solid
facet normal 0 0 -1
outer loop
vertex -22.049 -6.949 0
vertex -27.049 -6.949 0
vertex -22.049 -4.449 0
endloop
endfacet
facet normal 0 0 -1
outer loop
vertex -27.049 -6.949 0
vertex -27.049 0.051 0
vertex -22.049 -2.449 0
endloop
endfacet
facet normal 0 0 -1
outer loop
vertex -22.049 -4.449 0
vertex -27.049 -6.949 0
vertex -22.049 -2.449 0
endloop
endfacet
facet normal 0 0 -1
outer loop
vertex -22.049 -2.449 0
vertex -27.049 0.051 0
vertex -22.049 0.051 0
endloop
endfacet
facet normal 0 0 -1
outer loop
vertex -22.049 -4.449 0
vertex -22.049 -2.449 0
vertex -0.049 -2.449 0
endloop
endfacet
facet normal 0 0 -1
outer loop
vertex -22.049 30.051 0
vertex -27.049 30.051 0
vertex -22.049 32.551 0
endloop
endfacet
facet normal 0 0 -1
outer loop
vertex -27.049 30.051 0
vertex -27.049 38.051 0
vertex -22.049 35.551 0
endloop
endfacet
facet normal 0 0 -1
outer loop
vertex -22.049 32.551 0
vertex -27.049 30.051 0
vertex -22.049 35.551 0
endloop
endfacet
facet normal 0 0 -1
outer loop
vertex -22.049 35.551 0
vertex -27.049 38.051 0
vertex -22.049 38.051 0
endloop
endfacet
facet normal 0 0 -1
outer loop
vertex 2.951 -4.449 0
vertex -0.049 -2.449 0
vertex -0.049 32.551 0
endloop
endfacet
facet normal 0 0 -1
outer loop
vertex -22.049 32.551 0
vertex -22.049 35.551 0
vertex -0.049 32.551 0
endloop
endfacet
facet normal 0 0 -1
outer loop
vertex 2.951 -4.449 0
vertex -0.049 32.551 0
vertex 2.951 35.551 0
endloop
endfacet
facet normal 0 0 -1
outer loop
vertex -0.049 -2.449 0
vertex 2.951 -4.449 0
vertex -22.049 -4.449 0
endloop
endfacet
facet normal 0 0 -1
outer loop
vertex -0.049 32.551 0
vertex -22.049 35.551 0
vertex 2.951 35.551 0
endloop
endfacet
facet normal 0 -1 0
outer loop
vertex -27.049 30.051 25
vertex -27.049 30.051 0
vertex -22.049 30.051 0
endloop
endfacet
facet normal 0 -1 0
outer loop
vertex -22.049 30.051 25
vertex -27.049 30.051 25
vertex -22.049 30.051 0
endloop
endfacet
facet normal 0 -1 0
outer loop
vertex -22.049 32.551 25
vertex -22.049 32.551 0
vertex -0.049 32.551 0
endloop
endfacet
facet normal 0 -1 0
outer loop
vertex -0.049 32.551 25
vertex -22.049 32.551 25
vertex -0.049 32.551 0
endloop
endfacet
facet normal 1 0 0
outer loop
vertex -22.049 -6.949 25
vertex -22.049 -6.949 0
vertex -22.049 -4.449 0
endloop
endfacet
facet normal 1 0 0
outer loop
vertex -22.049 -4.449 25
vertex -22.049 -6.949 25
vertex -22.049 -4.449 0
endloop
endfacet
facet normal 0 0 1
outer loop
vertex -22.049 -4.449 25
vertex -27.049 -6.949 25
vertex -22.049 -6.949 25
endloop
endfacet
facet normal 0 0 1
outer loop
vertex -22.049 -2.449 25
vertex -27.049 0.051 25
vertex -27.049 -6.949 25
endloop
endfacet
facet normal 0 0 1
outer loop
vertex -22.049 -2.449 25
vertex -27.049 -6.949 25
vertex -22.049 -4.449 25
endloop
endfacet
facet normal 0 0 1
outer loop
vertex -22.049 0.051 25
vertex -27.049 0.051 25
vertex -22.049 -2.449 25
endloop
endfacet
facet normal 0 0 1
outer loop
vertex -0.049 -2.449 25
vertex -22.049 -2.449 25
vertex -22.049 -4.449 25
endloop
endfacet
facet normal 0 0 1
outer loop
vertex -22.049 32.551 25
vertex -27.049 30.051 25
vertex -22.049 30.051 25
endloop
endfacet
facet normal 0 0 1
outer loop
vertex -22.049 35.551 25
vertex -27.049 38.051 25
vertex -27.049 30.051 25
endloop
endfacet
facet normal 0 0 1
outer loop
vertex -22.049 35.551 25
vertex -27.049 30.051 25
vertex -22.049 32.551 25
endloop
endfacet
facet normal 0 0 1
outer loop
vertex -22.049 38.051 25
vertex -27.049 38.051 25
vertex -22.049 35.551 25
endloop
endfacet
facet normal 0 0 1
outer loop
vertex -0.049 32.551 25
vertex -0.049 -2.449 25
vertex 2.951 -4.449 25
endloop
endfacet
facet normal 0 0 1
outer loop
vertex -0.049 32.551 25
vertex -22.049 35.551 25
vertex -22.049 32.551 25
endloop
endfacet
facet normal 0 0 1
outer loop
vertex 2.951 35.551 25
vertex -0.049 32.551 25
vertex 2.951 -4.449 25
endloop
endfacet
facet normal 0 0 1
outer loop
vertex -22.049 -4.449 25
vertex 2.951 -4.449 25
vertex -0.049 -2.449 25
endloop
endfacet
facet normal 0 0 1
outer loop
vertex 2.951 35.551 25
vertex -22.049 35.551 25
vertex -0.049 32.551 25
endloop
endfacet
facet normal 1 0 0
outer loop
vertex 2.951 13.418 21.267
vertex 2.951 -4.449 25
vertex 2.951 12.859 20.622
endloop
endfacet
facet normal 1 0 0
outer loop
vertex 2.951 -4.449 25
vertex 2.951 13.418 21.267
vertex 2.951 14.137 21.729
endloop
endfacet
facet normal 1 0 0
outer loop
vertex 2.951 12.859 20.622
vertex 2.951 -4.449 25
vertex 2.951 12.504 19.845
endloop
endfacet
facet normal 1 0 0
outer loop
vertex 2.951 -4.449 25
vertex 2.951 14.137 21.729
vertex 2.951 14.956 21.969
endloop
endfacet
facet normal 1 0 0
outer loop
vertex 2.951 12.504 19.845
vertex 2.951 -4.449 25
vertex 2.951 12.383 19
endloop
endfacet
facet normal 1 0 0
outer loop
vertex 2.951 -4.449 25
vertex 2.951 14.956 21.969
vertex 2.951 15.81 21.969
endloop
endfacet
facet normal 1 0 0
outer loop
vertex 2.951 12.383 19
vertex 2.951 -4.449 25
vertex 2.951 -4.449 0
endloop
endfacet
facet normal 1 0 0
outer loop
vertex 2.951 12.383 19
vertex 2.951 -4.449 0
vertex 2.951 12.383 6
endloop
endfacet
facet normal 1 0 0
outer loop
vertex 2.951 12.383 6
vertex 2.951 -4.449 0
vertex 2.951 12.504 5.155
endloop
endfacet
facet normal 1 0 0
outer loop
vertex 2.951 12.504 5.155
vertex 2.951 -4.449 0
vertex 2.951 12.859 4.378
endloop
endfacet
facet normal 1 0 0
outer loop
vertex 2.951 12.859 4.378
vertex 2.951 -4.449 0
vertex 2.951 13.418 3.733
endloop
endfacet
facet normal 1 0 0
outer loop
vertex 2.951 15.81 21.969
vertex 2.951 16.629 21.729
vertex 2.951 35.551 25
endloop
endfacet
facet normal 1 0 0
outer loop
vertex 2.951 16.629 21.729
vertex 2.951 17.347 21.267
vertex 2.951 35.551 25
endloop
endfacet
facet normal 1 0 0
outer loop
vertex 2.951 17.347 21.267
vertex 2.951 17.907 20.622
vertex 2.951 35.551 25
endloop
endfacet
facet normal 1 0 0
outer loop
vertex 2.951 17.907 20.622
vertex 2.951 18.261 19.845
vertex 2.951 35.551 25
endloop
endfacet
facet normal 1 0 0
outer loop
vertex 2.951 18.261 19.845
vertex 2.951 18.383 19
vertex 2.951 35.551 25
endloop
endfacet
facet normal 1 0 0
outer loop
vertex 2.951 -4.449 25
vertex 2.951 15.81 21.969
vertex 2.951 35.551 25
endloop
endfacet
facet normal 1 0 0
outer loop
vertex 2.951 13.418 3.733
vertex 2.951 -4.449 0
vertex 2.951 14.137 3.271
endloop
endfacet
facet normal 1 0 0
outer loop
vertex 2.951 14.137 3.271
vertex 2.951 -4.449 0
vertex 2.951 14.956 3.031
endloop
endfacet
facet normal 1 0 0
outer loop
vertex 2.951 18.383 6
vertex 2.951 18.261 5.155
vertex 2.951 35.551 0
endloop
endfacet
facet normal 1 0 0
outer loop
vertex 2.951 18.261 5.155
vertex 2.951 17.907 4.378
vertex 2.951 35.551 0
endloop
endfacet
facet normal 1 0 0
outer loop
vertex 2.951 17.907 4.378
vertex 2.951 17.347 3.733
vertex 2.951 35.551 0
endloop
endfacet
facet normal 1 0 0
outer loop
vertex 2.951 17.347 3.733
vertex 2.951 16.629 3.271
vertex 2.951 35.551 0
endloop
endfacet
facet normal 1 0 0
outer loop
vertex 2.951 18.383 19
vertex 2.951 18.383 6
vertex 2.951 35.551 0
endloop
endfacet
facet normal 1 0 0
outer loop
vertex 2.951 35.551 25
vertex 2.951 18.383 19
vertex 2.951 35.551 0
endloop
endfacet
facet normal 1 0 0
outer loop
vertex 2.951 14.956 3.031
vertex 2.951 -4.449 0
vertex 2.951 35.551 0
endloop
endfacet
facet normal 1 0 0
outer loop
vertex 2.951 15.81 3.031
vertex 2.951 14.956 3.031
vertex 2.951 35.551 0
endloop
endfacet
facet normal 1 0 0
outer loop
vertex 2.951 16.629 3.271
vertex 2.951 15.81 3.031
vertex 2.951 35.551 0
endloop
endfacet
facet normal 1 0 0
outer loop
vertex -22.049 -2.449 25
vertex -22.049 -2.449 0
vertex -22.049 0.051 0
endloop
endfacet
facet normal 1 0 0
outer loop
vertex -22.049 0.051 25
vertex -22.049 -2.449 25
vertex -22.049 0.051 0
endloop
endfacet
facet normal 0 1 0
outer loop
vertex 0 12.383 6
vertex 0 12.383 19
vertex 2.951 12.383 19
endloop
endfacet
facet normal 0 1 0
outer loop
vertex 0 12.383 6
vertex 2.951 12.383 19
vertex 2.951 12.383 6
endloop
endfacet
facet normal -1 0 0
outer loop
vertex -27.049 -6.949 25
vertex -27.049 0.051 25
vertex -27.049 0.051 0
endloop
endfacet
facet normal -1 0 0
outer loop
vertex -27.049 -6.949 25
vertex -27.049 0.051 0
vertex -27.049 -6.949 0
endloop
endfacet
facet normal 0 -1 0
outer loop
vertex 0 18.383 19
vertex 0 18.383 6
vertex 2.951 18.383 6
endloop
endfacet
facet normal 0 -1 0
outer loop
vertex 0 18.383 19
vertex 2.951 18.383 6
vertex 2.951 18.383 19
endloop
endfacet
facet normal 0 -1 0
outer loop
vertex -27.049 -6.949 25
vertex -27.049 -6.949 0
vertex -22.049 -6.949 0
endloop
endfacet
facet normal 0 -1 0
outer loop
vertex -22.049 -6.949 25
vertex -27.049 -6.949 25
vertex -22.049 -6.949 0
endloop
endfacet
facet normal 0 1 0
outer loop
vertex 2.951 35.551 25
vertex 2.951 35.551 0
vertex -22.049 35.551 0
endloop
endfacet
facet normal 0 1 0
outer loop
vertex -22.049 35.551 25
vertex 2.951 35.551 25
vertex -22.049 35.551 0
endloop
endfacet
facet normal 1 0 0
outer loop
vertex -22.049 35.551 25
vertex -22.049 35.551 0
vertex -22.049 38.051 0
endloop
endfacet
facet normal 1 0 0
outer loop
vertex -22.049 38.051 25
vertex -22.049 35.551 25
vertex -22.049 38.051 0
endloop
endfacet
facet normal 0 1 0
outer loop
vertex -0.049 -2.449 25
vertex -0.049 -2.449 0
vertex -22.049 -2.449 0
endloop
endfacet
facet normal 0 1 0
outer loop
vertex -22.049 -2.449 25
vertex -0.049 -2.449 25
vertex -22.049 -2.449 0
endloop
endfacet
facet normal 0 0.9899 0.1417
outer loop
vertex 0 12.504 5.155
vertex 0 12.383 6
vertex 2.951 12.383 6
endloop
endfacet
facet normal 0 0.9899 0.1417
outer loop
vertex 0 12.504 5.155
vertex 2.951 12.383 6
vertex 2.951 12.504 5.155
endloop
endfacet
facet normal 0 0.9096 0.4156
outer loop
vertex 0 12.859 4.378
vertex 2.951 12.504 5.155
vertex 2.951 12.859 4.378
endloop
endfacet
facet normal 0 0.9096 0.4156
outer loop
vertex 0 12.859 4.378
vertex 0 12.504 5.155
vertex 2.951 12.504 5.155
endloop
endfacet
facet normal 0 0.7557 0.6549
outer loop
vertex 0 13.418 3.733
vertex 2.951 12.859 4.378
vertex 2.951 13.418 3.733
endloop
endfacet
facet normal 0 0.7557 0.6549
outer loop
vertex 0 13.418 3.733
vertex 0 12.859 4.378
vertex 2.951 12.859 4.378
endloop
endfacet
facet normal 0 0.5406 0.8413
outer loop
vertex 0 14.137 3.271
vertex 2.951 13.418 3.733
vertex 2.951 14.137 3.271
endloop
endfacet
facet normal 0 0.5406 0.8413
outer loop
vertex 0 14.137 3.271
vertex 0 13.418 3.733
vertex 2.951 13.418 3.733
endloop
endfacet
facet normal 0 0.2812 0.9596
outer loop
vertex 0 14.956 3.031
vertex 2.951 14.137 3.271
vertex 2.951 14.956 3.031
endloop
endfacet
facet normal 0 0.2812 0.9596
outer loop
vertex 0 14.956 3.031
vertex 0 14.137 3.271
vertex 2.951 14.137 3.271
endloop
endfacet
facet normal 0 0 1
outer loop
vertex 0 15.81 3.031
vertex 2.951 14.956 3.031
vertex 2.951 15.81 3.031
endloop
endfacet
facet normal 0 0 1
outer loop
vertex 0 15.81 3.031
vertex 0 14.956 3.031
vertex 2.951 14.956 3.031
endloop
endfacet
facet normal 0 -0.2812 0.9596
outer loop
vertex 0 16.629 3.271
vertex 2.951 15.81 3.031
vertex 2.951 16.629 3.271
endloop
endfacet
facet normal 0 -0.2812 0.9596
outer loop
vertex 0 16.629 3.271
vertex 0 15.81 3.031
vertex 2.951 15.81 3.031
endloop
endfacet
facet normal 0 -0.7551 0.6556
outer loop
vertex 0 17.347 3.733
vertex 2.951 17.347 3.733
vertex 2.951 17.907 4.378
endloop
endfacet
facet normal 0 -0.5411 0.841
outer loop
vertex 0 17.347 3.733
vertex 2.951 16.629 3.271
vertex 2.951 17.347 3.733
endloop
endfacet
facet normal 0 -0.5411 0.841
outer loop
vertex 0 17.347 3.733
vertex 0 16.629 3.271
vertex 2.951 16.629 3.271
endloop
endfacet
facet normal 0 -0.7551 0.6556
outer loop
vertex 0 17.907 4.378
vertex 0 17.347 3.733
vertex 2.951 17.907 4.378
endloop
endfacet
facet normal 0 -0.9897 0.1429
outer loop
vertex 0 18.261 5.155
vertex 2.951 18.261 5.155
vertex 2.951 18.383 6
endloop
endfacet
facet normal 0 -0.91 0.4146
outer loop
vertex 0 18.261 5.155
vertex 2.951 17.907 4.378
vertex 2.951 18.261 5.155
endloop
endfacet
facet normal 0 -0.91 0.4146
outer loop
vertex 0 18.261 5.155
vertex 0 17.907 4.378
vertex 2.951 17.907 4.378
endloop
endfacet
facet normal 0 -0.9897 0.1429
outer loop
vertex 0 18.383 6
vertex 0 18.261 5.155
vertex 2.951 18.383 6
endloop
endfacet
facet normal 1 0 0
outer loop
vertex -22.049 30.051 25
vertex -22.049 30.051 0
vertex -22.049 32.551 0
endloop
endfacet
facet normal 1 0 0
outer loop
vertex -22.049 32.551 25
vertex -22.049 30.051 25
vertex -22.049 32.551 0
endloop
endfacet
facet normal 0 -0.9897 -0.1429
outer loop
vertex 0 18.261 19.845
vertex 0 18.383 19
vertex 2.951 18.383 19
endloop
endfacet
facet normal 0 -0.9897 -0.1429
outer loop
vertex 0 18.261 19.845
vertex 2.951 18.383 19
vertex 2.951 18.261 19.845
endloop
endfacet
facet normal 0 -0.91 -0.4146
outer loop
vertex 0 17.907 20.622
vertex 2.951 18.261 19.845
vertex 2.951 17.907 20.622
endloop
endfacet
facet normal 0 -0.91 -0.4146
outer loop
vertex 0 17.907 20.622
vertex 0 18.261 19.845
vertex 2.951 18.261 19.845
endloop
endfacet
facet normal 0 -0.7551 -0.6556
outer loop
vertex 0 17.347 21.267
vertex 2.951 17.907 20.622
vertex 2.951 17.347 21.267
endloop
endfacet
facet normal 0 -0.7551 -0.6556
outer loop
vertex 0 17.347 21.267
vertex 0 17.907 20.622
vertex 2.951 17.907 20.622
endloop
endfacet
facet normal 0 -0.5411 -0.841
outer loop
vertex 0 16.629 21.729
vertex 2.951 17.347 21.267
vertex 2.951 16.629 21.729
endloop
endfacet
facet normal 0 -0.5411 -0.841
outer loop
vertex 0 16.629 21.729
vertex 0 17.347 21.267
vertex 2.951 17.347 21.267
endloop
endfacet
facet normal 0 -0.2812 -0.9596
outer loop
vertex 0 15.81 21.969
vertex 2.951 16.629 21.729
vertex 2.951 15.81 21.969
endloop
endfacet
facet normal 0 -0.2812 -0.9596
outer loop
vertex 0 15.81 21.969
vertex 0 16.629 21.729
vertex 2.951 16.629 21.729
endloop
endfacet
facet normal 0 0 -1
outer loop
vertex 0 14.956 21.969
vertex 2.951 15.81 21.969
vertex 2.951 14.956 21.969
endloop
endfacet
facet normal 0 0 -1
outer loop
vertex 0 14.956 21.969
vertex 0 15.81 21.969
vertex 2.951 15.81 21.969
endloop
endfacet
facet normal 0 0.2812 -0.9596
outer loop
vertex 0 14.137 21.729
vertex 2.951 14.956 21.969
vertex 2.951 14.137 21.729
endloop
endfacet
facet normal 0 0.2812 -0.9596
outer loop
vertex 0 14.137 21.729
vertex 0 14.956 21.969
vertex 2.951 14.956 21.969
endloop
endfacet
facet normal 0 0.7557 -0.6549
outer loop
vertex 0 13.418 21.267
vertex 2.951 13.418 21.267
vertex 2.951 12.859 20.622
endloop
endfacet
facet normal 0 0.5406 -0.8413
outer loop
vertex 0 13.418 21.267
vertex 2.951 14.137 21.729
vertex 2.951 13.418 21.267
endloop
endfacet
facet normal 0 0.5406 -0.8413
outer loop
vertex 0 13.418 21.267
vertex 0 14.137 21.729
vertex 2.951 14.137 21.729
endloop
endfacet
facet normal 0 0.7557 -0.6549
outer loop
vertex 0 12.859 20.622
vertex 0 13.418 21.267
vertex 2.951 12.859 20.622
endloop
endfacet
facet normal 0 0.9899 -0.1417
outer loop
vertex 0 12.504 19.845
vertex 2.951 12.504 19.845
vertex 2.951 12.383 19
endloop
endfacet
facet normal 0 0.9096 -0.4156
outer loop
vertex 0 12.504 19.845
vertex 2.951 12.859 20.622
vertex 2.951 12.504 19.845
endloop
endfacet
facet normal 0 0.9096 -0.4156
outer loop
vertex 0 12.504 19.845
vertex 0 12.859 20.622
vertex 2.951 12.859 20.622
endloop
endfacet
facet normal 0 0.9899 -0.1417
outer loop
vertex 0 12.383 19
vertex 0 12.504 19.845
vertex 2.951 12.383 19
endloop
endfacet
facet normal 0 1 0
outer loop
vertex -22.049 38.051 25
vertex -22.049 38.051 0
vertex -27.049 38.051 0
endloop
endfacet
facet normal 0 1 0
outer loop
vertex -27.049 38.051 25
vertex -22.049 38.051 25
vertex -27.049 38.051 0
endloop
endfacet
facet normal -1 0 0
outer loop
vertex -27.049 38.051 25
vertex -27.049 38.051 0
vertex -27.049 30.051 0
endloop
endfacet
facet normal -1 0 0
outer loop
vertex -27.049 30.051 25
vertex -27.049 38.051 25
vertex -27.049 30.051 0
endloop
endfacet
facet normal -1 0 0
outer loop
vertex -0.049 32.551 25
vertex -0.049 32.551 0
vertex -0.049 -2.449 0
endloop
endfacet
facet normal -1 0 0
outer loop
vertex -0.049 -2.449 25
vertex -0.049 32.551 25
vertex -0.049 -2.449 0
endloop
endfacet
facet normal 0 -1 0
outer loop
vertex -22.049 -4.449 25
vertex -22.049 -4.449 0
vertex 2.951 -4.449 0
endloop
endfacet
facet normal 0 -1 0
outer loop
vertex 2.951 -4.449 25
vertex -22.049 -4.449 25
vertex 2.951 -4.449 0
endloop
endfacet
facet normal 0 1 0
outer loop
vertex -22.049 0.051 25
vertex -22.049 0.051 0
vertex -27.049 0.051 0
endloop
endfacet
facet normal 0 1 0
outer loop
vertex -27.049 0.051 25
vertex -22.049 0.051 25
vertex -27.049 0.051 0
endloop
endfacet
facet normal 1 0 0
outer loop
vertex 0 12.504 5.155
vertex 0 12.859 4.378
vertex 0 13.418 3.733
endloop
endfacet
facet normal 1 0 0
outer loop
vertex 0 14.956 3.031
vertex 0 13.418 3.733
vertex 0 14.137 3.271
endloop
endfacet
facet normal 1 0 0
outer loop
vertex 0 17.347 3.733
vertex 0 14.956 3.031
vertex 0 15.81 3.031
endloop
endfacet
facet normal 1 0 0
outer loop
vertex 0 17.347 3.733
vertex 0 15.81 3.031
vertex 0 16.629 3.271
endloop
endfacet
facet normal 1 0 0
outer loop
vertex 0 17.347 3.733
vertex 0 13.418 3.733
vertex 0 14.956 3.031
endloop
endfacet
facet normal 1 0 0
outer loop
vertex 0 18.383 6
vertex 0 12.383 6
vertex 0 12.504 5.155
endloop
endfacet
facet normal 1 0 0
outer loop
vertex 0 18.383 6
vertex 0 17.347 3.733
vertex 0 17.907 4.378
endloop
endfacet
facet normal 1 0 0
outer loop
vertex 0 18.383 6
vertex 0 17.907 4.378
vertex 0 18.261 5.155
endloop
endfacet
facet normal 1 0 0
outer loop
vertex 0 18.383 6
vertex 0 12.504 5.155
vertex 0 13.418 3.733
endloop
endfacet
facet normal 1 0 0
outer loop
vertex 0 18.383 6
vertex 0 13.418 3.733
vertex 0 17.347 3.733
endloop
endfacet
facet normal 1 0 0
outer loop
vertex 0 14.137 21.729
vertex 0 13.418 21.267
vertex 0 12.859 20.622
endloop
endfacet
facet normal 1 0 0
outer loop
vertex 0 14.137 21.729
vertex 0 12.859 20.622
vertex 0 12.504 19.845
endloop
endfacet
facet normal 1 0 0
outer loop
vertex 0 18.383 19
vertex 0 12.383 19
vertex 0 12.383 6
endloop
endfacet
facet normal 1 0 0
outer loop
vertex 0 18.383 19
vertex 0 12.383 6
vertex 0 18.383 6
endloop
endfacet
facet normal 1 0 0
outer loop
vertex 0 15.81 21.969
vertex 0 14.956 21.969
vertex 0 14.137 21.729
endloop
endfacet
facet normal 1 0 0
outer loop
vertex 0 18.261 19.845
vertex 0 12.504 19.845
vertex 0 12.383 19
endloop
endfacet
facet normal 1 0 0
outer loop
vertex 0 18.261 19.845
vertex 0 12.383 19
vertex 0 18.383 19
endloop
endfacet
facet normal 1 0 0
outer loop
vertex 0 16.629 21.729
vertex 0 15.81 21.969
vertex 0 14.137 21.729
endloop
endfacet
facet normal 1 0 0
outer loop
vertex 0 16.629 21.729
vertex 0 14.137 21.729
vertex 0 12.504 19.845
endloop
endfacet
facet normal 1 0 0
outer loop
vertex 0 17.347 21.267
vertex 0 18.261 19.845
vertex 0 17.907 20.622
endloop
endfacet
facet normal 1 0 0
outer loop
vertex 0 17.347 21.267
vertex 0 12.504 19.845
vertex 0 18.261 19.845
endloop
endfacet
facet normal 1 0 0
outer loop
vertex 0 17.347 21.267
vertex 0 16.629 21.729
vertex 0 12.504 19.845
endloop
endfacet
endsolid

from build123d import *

# Parameters (mm, degrees)
F1_DEPTH = 25
F3_DEPTH = 25


with BuildPart() as f1:
    # F0 (on Top) → F1 (new body)
    with BuildSketch(Plane.XY):
        Polygon((-22.048956, -2.44946), (-22.048956, 0.05054), (-27.048956, 0.05054), (-27.048956, -6.949464), (-22.048956, -6.949464), (-22.048956, -4.449464), (2.951044, -4.449464), (2.951044, 35.550536), (-22.048956, 35.550536), (-22.048956, 38.050536), (-27.048956, 38.050536), (-27.048956, 30.050536), (-22.048956, 30.050536), (-22.048956, 32.550536), (-0.048956, 32.550536), (-0.048956, -2.44946), align=None)
    extrude(amount=F1_DEPTH)

    # F2 (on Right) → F3 (cut)
    with BuildSketch(Plane.YZ):
        with BuildLine():
            Line((18.382891, 6), (18.382891, 19))
            ThreePointArc((18.382891, 19), (15.382891, 22), (12.382891, 19))
            Line((12.382891, 19), (12.382891, 6))
            ThreePointArc((12.382891, 6), (15.382891, 3), (18.382891, 6))
        make_face()
    extrude(amount=F3_DEPTH, mode=Mode.SUBTRACT)


solid = f1.part
